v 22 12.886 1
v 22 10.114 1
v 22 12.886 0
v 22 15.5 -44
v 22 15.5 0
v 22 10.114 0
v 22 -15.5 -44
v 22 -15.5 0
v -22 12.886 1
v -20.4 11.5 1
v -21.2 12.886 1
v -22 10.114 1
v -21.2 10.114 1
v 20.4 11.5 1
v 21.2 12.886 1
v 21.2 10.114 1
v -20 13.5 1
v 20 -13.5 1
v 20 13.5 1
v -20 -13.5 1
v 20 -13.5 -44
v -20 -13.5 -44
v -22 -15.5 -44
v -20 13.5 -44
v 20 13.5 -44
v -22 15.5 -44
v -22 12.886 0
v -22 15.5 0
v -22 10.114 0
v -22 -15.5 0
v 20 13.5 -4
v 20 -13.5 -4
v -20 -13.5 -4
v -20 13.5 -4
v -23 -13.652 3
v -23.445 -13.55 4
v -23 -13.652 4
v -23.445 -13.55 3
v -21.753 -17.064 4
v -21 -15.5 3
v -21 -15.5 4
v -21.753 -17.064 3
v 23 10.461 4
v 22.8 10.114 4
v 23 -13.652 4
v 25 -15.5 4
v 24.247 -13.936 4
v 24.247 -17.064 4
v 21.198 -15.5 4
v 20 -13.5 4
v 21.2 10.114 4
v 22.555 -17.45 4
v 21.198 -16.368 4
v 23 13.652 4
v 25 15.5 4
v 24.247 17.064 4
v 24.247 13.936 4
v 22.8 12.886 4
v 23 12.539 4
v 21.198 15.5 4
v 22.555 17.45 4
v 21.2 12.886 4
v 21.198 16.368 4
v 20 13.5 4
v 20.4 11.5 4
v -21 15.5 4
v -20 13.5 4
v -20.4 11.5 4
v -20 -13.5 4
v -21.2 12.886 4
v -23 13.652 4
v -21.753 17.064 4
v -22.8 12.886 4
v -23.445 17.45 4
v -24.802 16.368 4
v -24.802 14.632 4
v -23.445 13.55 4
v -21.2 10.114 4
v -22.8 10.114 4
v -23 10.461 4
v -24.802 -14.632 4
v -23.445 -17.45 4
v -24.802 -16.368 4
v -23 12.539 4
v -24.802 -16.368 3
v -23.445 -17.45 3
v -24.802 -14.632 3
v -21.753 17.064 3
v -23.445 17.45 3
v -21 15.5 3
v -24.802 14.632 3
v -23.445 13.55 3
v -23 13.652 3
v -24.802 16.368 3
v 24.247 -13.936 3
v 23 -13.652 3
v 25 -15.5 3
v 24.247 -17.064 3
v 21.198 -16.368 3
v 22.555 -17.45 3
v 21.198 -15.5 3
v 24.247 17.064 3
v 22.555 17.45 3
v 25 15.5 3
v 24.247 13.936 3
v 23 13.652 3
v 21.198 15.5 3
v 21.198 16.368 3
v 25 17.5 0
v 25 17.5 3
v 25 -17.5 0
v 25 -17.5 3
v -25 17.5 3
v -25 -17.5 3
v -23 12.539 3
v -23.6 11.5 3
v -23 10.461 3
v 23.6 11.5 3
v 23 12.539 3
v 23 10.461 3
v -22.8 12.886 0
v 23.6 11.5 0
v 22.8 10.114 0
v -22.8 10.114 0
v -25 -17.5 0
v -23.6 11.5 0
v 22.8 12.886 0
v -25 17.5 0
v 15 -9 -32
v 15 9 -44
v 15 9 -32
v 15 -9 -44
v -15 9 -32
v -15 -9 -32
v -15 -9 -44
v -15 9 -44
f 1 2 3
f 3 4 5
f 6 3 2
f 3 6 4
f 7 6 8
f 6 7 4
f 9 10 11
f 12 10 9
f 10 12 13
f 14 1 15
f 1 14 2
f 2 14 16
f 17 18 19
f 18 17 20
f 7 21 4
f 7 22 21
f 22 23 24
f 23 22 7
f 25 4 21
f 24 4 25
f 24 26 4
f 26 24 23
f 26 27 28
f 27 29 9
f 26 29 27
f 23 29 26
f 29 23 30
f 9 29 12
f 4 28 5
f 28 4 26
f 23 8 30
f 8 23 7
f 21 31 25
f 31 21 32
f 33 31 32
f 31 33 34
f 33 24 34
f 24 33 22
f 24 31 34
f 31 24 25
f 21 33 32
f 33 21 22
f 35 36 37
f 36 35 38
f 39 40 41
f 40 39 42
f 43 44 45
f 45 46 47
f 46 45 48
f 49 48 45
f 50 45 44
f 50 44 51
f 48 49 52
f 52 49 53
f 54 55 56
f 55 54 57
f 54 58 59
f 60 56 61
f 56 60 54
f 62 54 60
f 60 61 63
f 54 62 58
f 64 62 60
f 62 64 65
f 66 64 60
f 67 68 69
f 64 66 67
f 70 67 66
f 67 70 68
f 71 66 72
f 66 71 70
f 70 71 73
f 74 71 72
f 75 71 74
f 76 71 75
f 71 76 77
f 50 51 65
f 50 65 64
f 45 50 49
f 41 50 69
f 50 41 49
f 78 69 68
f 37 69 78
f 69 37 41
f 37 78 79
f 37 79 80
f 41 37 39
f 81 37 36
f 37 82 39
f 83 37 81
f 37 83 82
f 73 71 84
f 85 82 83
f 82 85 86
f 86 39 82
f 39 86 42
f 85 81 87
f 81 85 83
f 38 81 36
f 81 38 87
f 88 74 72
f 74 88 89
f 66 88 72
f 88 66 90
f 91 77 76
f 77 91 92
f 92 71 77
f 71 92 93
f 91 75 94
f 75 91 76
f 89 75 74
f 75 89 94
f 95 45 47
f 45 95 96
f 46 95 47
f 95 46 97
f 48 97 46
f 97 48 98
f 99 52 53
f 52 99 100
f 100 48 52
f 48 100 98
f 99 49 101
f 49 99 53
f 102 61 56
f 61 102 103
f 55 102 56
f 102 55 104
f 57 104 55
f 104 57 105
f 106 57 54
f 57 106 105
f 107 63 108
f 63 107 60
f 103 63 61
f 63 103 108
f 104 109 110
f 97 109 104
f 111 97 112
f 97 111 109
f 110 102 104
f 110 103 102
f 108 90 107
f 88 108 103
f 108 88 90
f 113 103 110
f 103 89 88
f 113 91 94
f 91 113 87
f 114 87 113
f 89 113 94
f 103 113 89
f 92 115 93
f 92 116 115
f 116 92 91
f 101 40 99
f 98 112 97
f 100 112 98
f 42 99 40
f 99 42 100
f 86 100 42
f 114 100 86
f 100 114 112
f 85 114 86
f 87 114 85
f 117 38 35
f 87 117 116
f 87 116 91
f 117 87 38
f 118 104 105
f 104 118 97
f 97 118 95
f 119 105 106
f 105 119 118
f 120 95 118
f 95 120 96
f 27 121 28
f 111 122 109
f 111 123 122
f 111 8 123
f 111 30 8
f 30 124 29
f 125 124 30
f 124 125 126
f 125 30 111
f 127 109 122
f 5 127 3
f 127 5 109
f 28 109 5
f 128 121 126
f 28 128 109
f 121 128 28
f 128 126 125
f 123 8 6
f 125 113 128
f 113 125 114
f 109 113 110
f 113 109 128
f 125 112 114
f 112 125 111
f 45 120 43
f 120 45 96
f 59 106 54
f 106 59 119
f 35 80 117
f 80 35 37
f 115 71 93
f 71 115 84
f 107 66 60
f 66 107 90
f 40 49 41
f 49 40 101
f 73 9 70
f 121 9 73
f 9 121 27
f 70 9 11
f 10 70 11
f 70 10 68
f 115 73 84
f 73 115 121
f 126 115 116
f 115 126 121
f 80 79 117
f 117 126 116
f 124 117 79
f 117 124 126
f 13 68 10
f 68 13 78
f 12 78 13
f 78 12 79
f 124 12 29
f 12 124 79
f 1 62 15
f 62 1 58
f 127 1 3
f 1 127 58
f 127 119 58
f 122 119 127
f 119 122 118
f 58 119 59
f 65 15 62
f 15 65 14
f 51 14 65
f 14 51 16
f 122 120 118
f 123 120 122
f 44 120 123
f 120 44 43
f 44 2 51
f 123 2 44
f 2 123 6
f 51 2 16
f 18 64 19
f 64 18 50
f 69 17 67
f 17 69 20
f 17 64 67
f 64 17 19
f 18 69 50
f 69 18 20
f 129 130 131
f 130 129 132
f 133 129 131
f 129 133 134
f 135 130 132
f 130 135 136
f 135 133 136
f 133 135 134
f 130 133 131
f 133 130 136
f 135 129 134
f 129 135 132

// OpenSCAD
// Parameters
cutout_width_mm = 40; //[20:80:0.5]
cutout_height_mm = 27; //[13.5:54:0.5]
panel_thickness_mm = 2; //[1:6:0.5]
flange_width_mm = 50; //[35:80:0.5]
flange_height_mm = 35; //[25:70:0.5]
flange_thickness_mm = 3; //[1.5:8:0.5]
bezel_thickness_mm = 2; //[1:6:0.5]
bezel_radius_mm = 2; //[0.5:6:0.5]
overall_depth_mm = 45; //[25:90:1]
body_wall_mm = 2; //[1:5:0.5]
overlap_mm = 1; //[0.5:2:0.1]
screw_hole_diameter_mm = 3.2; //[2:6:0.1]
screw_hole_pitch_mm = 44; //[30:70:0.5]
screw_hole_edge_margin_mm = 6; //[3:12:0.5]
switch_opening_width_mm = 19; //[10:30:0.5]
switch_opening_height_mm = 13; //[8:20:0.5]
fuse_opening_width_mm = 22; //[12:35:0.5]
fuse_opening_height_mm = 12; //[7:20:0.5]
feature_opening_depth_mm = 6; //[3:15:0.5]
rear_terminal_width_mm = 30; //[15:60:0.5]
rear_terminal_height_mm = 18; //[10:40:0.5]
rear_terminal_depth_mm = 12; //[6:30:0.5]
include_switch = 1; //[0:1:1]
include_fuse_drawer = 1; //[0:1:1]
include_screw_mounts = 1; //[0:1:1]

// IEC Module - complete geometry
module iec() {
  color("Black") {
    // IEC Inlet Body
    difference() {
      translate([0, 0, -overall_depth_mm/2 + overlap_mm])
        cube([cutout_width_mm + 2*body_wall_mm, cutout_height_mm + 2*body_wall_mm, overall_depth_mm], center=true);
      translate([0, 0, -(overall_depth_mm - flange_thickness_mm - bezel_thickness_mm)/2 + overlap_mm - (flange_thickness_mm + bezel_thickness_mm)])
        cube([cutout_width_mm, cutout_height_mm, overall_depth_mm - flange_thickness_mm - bezel_thickness_mm], center=true);
    }
  }
}

// Mod - complete geometry
module mod() {
  color("DimGray") {
    // Rear Terminal Region
    translate([0, 0, -overall_depth_mm + rear_terminal_depth_mm/2 + overlap_mm])
      cube([rear_terminal_width_mm, rear_terminal_height_mm, rear_terminal_depth_mm], center=true);
  }
}

// Front Flange and Bezel
module front_flange_bezel() {
  color("Silver") {
    difference() {
      union() {
        // Front Flange Plate
        translate([0, 0, flange_thickness_mm/2])
          cube([flange_width_mm, flange_height_mm, flange_thickness_mm], center=true);
        // Front Bezel Plate
        translate([0, 0, flange_thickness_mm + bezel_thickness_mm/2 - overlap_mm])
          cube([flange_width_mm - 2*bezel_radius_mm, flange_height_mm - 2*bezel_radius_mm, bezel_thickness_mm], center=true);
        // Bezel Corner Cylinders
        for (x = [-1, 1], y = [-1, 1])
          translate([x * (flange_width_mm/2 - bezel_radius_mm), y * (flange_height_mm/2 - bezel_radius_mm), flange_thickness_mm + bezel_thickness_mm/2 - overlap_mm])
            cylinder(r=bezel_radius_mm, h=bezel_thickness_mm, center=true);
      }
      // IEC Socket Opening Cut
      translate([0, 0, (flange_thickness_mm + bezel_thickness_mm)/2])
        cube([cutout_width_mm, cutout_height_mm, flange_thickness_mm + bezel_thickness_mm + feature_opening_depth_mm], center=true);
      // Switch Actuator Opening
      if (include_switch)
        translate([-(cutout_width_mm/2) + switch_opening_width_mm/2 + body_wall_mm, (cutout_height_mm/2) - switch_opening_height_mm/2 - body_wall_mm, (flange_thickness_mm + bezel_thickness_mm)/2])
          cube([switch_opening_width_mm, switch_opening_height_mm, flange_thickness_mm + bezel_thickness_mm + feature_opening_depth_mm], center=true);
      // Fuse Drawer Opening
      if (include_fuse_drawer)
        translate([(cutout_width_mm/2) - fuse_opening_width_mm/2 - body_wall_mm, (cutout_height_mm/2) - fuse_opening_height_mm/2 - body_wall_mm, (flange_thickness_mm + bezel_thickness_mm)/2])
          cube([fuse_opening_width_mm, fuse_opening_height_mm, flange_thickness_mm + bezel_thickness_mm + feature_opening_depth_mm], center=true);
      // Mounting Screw Holes
      if (include_screw_mounts) {
        for (x = [-1, 1])
          translate([x * screw_hole_pitch_mm/2, flange_height_mm/2 - screw_hole_edge_margin_mm, (flange_thickness_mm + bezel_thickness_mm)/2])
            cylinder(r=screw_hole_diameter_mm/2, h=flange_thickness_mm + bezel_thickness_mm + feature_opening_depth_mm, center=true);
      }
    }
  }
}

// Assembly
module assembly() {
  iec();
  mod();
  front_flange_bezel();
}

assembly();
